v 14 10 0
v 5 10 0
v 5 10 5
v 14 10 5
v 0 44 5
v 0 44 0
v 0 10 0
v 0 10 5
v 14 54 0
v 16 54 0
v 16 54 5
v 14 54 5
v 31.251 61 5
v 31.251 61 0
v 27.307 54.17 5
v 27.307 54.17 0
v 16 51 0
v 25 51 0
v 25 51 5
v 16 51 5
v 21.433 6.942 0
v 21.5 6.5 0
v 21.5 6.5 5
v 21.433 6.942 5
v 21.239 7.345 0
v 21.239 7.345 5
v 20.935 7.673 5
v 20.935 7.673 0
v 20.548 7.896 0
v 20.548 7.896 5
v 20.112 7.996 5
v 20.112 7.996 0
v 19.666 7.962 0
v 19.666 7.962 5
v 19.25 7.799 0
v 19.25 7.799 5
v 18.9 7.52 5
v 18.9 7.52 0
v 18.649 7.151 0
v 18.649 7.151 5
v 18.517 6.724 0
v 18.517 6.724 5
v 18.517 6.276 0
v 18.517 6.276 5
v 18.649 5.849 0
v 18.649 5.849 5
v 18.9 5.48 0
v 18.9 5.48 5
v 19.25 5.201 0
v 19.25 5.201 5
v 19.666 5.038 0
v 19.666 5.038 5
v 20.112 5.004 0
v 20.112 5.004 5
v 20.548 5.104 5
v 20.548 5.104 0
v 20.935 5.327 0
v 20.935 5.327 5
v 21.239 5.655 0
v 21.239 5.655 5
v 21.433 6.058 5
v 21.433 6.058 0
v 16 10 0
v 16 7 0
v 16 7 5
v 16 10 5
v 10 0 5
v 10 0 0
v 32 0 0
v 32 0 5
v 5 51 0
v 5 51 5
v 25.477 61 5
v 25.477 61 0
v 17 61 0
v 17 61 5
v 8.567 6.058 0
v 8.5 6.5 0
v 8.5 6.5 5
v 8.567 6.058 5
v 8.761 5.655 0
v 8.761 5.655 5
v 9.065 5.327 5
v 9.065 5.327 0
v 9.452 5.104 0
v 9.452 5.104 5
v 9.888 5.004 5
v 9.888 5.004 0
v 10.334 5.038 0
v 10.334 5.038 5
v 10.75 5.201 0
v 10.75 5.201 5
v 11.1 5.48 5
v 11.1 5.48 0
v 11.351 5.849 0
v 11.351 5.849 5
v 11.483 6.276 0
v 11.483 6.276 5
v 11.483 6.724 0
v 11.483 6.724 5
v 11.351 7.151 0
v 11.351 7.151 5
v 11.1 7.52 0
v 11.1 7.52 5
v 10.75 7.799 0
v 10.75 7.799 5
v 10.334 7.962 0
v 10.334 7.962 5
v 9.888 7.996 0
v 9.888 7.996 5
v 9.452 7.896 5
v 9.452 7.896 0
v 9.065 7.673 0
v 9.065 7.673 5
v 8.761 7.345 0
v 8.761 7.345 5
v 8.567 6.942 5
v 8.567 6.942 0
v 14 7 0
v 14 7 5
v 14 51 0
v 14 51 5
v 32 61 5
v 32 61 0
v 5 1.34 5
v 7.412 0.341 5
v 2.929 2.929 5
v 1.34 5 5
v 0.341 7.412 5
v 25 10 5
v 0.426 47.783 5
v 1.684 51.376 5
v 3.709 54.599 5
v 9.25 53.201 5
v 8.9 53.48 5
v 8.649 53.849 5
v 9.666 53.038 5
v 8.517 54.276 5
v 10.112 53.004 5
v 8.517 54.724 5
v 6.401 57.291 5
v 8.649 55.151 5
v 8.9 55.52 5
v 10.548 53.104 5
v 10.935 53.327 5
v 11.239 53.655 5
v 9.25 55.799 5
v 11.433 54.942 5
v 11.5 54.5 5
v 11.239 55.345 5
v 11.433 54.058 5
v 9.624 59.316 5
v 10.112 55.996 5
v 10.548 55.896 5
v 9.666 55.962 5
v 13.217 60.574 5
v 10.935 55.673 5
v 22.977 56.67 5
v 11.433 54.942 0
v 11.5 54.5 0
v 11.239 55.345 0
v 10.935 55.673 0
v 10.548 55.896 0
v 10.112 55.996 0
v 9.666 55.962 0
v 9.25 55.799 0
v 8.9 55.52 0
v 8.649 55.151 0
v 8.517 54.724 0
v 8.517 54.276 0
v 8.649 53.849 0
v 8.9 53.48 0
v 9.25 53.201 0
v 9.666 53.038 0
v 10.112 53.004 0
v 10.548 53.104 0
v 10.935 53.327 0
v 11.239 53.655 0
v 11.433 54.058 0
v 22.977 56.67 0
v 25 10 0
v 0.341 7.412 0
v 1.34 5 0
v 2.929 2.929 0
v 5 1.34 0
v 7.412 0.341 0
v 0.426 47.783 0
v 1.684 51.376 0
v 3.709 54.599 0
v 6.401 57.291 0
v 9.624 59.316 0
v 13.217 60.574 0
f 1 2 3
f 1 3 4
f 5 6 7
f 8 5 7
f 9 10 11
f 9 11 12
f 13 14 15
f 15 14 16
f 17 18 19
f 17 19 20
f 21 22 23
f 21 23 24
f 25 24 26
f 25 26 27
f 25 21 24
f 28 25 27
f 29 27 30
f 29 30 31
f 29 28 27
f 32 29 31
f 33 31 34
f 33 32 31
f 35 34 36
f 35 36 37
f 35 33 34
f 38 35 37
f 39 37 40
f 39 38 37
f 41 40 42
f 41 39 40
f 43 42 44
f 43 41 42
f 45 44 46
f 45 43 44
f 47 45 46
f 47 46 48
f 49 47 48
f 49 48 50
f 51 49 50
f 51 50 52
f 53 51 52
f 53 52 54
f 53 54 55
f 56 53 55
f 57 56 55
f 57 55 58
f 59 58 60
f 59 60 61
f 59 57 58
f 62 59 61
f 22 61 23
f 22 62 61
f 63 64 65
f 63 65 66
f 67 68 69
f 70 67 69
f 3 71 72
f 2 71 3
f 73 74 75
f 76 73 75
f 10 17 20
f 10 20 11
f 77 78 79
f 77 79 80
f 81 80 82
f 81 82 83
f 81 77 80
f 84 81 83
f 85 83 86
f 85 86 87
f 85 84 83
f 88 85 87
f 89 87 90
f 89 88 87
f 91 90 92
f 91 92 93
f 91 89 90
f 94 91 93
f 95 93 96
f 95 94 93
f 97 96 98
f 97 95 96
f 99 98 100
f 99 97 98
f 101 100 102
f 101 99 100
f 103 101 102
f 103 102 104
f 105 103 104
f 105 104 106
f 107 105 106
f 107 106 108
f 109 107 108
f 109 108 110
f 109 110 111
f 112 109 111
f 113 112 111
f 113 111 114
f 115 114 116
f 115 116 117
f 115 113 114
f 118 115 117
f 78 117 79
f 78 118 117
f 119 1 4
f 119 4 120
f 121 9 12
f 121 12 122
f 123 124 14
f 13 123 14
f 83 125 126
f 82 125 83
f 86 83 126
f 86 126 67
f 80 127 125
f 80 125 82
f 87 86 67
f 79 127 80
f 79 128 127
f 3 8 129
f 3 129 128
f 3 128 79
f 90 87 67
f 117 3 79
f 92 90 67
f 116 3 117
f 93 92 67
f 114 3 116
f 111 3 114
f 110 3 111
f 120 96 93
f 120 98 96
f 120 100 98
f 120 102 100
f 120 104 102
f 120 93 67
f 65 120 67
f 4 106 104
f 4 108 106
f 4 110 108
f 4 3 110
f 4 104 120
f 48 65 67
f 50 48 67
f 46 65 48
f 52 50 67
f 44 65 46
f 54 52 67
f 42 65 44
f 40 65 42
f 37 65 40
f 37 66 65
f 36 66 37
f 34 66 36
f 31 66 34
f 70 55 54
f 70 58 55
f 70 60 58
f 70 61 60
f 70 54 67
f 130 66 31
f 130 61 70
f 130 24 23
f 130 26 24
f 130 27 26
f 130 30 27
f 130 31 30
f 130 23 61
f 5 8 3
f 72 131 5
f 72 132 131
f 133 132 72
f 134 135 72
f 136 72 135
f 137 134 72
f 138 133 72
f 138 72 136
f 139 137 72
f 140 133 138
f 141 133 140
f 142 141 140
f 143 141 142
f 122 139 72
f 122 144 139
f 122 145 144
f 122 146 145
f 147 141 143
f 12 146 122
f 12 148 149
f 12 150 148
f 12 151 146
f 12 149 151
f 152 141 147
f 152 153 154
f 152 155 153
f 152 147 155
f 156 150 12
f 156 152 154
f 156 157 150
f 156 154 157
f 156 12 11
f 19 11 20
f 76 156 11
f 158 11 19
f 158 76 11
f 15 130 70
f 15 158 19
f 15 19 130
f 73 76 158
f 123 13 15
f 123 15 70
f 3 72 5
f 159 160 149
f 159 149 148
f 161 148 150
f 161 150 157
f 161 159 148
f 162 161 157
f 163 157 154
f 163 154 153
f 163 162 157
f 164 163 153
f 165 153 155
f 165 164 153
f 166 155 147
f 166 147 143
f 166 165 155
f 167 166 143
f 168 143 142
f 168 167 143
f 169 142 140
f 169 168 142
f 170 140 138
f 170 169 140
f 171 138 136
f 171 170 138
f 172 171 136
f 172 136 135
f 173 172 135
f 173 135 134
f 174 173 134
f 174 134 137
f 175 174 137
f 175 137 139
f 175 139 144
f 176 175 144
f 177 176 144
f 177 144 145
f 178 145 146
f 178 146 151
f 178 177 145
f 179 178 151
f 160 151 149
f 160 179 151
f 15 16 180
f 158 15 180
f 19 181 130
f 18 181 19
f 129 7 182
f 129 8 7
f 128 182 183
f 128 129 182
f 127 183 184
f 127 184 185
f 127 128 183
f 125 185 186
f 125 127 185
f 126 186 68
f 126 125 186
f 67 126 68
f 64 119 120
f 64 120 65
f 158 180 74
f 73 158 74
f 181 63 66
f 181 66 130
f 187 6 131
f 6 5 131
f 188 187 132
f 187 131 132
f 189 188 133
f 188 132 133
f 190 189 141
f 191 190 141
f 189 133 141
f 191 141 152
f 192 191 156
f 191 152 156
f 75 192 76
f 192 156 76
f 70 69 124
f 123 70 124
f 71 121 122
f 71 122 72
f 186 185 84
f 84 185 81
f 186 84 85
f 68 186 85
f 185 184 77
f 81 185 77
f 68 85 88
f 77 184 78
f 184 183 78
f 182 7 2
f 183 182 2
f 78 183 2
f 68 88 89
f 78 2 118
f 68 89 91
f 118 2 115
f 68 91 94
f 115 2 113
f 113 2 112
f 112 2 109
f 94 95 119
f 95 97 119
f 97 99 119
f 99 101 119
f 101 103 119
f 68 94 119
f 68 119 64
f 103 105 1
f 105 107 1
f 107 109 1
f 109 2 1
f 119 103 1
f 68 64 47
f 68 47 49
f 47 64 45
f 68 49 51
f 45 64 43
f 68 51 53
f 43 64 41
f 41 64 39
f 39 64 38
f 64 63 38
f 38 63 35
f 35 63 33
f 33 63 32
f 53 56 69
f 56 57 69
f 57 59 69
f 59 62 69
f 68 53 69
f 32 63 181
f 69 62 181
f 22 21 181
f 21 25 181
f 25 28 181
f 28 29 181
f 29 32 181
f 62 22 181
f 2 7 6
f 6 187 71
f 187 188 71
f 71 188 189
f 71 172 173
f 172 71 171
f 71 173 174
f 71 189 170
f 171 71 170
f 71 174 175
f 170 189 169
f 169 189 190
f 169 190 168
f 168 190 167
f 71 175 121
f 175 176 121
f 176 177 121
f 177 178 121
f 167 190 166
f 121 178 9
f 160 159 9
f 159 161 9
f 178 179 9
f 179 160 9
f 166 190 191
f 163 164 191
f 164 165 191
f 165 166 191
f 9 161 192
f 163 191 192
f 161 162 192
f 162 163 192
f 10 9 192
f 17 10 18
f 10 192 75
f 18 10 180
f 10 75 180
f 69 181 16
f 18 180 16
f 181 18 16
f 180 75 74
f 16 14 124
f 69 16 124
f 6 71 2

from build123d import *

# Parameters (mm, degrees)
ESQUISSE1_R        = 1.5
BOSS_EXTRU_1_DEPTH = 5
CONG_1_R           = 17
CONG_2_R           = 10


with BuildPart() as part:
    # Esquisse1 → Boss.-Extru.1 (new body)
    with BuildSketch(Plane.XY):
        Polygon((0, 0), (25, 0), (32, 0), (32, 61), (31.250785563, 61), (27.30740989, 54.169872981), (22.977282871, 56.669872981), (25.477282871, 61), (15, 61), (0, 61), align=None)
        with Locations((10, 54.5)):
            Circle(ESQUISSE1_R, mode=Mode.SUBTRACT)
        with Locations((20, 6.5)):
            Circle(ESQUISSE1_R, mode=Mode.SUBTRACT)
        with Locations(Location((10, 6.5, 0), (0, 0, 180))):
            Circle(ESQUISSE1_R, mode=Mode.SUBTRACT)
        Polygon((14, 51), (5, 51), (5, 10), (14, 10), (14, 7), (16, 7), (16, 10), (25, 10), (25, 51), (16, 51), (16, 54), (14, 54), align=None, mode=Mode.SUBTRACT)
    extrude(amount=BOSS_EXTRU_1_DEPTH)

    # Congé1
    cong_1_edges = [part.edges().sort_by_distance(p)[0] for p in [
        (0, 61, 2.5),
    ]]
    fillet(cong_1_edges, radius=CONG_1_R)

    # Congé2
    cong_2_edges = [part.edges().sort_by_distance(p)[0] for p in [
        (0, 0, 2.5),
    ]]
    fillet(cong_2_edges, radius=CONG_2_R)


solid = part.part
